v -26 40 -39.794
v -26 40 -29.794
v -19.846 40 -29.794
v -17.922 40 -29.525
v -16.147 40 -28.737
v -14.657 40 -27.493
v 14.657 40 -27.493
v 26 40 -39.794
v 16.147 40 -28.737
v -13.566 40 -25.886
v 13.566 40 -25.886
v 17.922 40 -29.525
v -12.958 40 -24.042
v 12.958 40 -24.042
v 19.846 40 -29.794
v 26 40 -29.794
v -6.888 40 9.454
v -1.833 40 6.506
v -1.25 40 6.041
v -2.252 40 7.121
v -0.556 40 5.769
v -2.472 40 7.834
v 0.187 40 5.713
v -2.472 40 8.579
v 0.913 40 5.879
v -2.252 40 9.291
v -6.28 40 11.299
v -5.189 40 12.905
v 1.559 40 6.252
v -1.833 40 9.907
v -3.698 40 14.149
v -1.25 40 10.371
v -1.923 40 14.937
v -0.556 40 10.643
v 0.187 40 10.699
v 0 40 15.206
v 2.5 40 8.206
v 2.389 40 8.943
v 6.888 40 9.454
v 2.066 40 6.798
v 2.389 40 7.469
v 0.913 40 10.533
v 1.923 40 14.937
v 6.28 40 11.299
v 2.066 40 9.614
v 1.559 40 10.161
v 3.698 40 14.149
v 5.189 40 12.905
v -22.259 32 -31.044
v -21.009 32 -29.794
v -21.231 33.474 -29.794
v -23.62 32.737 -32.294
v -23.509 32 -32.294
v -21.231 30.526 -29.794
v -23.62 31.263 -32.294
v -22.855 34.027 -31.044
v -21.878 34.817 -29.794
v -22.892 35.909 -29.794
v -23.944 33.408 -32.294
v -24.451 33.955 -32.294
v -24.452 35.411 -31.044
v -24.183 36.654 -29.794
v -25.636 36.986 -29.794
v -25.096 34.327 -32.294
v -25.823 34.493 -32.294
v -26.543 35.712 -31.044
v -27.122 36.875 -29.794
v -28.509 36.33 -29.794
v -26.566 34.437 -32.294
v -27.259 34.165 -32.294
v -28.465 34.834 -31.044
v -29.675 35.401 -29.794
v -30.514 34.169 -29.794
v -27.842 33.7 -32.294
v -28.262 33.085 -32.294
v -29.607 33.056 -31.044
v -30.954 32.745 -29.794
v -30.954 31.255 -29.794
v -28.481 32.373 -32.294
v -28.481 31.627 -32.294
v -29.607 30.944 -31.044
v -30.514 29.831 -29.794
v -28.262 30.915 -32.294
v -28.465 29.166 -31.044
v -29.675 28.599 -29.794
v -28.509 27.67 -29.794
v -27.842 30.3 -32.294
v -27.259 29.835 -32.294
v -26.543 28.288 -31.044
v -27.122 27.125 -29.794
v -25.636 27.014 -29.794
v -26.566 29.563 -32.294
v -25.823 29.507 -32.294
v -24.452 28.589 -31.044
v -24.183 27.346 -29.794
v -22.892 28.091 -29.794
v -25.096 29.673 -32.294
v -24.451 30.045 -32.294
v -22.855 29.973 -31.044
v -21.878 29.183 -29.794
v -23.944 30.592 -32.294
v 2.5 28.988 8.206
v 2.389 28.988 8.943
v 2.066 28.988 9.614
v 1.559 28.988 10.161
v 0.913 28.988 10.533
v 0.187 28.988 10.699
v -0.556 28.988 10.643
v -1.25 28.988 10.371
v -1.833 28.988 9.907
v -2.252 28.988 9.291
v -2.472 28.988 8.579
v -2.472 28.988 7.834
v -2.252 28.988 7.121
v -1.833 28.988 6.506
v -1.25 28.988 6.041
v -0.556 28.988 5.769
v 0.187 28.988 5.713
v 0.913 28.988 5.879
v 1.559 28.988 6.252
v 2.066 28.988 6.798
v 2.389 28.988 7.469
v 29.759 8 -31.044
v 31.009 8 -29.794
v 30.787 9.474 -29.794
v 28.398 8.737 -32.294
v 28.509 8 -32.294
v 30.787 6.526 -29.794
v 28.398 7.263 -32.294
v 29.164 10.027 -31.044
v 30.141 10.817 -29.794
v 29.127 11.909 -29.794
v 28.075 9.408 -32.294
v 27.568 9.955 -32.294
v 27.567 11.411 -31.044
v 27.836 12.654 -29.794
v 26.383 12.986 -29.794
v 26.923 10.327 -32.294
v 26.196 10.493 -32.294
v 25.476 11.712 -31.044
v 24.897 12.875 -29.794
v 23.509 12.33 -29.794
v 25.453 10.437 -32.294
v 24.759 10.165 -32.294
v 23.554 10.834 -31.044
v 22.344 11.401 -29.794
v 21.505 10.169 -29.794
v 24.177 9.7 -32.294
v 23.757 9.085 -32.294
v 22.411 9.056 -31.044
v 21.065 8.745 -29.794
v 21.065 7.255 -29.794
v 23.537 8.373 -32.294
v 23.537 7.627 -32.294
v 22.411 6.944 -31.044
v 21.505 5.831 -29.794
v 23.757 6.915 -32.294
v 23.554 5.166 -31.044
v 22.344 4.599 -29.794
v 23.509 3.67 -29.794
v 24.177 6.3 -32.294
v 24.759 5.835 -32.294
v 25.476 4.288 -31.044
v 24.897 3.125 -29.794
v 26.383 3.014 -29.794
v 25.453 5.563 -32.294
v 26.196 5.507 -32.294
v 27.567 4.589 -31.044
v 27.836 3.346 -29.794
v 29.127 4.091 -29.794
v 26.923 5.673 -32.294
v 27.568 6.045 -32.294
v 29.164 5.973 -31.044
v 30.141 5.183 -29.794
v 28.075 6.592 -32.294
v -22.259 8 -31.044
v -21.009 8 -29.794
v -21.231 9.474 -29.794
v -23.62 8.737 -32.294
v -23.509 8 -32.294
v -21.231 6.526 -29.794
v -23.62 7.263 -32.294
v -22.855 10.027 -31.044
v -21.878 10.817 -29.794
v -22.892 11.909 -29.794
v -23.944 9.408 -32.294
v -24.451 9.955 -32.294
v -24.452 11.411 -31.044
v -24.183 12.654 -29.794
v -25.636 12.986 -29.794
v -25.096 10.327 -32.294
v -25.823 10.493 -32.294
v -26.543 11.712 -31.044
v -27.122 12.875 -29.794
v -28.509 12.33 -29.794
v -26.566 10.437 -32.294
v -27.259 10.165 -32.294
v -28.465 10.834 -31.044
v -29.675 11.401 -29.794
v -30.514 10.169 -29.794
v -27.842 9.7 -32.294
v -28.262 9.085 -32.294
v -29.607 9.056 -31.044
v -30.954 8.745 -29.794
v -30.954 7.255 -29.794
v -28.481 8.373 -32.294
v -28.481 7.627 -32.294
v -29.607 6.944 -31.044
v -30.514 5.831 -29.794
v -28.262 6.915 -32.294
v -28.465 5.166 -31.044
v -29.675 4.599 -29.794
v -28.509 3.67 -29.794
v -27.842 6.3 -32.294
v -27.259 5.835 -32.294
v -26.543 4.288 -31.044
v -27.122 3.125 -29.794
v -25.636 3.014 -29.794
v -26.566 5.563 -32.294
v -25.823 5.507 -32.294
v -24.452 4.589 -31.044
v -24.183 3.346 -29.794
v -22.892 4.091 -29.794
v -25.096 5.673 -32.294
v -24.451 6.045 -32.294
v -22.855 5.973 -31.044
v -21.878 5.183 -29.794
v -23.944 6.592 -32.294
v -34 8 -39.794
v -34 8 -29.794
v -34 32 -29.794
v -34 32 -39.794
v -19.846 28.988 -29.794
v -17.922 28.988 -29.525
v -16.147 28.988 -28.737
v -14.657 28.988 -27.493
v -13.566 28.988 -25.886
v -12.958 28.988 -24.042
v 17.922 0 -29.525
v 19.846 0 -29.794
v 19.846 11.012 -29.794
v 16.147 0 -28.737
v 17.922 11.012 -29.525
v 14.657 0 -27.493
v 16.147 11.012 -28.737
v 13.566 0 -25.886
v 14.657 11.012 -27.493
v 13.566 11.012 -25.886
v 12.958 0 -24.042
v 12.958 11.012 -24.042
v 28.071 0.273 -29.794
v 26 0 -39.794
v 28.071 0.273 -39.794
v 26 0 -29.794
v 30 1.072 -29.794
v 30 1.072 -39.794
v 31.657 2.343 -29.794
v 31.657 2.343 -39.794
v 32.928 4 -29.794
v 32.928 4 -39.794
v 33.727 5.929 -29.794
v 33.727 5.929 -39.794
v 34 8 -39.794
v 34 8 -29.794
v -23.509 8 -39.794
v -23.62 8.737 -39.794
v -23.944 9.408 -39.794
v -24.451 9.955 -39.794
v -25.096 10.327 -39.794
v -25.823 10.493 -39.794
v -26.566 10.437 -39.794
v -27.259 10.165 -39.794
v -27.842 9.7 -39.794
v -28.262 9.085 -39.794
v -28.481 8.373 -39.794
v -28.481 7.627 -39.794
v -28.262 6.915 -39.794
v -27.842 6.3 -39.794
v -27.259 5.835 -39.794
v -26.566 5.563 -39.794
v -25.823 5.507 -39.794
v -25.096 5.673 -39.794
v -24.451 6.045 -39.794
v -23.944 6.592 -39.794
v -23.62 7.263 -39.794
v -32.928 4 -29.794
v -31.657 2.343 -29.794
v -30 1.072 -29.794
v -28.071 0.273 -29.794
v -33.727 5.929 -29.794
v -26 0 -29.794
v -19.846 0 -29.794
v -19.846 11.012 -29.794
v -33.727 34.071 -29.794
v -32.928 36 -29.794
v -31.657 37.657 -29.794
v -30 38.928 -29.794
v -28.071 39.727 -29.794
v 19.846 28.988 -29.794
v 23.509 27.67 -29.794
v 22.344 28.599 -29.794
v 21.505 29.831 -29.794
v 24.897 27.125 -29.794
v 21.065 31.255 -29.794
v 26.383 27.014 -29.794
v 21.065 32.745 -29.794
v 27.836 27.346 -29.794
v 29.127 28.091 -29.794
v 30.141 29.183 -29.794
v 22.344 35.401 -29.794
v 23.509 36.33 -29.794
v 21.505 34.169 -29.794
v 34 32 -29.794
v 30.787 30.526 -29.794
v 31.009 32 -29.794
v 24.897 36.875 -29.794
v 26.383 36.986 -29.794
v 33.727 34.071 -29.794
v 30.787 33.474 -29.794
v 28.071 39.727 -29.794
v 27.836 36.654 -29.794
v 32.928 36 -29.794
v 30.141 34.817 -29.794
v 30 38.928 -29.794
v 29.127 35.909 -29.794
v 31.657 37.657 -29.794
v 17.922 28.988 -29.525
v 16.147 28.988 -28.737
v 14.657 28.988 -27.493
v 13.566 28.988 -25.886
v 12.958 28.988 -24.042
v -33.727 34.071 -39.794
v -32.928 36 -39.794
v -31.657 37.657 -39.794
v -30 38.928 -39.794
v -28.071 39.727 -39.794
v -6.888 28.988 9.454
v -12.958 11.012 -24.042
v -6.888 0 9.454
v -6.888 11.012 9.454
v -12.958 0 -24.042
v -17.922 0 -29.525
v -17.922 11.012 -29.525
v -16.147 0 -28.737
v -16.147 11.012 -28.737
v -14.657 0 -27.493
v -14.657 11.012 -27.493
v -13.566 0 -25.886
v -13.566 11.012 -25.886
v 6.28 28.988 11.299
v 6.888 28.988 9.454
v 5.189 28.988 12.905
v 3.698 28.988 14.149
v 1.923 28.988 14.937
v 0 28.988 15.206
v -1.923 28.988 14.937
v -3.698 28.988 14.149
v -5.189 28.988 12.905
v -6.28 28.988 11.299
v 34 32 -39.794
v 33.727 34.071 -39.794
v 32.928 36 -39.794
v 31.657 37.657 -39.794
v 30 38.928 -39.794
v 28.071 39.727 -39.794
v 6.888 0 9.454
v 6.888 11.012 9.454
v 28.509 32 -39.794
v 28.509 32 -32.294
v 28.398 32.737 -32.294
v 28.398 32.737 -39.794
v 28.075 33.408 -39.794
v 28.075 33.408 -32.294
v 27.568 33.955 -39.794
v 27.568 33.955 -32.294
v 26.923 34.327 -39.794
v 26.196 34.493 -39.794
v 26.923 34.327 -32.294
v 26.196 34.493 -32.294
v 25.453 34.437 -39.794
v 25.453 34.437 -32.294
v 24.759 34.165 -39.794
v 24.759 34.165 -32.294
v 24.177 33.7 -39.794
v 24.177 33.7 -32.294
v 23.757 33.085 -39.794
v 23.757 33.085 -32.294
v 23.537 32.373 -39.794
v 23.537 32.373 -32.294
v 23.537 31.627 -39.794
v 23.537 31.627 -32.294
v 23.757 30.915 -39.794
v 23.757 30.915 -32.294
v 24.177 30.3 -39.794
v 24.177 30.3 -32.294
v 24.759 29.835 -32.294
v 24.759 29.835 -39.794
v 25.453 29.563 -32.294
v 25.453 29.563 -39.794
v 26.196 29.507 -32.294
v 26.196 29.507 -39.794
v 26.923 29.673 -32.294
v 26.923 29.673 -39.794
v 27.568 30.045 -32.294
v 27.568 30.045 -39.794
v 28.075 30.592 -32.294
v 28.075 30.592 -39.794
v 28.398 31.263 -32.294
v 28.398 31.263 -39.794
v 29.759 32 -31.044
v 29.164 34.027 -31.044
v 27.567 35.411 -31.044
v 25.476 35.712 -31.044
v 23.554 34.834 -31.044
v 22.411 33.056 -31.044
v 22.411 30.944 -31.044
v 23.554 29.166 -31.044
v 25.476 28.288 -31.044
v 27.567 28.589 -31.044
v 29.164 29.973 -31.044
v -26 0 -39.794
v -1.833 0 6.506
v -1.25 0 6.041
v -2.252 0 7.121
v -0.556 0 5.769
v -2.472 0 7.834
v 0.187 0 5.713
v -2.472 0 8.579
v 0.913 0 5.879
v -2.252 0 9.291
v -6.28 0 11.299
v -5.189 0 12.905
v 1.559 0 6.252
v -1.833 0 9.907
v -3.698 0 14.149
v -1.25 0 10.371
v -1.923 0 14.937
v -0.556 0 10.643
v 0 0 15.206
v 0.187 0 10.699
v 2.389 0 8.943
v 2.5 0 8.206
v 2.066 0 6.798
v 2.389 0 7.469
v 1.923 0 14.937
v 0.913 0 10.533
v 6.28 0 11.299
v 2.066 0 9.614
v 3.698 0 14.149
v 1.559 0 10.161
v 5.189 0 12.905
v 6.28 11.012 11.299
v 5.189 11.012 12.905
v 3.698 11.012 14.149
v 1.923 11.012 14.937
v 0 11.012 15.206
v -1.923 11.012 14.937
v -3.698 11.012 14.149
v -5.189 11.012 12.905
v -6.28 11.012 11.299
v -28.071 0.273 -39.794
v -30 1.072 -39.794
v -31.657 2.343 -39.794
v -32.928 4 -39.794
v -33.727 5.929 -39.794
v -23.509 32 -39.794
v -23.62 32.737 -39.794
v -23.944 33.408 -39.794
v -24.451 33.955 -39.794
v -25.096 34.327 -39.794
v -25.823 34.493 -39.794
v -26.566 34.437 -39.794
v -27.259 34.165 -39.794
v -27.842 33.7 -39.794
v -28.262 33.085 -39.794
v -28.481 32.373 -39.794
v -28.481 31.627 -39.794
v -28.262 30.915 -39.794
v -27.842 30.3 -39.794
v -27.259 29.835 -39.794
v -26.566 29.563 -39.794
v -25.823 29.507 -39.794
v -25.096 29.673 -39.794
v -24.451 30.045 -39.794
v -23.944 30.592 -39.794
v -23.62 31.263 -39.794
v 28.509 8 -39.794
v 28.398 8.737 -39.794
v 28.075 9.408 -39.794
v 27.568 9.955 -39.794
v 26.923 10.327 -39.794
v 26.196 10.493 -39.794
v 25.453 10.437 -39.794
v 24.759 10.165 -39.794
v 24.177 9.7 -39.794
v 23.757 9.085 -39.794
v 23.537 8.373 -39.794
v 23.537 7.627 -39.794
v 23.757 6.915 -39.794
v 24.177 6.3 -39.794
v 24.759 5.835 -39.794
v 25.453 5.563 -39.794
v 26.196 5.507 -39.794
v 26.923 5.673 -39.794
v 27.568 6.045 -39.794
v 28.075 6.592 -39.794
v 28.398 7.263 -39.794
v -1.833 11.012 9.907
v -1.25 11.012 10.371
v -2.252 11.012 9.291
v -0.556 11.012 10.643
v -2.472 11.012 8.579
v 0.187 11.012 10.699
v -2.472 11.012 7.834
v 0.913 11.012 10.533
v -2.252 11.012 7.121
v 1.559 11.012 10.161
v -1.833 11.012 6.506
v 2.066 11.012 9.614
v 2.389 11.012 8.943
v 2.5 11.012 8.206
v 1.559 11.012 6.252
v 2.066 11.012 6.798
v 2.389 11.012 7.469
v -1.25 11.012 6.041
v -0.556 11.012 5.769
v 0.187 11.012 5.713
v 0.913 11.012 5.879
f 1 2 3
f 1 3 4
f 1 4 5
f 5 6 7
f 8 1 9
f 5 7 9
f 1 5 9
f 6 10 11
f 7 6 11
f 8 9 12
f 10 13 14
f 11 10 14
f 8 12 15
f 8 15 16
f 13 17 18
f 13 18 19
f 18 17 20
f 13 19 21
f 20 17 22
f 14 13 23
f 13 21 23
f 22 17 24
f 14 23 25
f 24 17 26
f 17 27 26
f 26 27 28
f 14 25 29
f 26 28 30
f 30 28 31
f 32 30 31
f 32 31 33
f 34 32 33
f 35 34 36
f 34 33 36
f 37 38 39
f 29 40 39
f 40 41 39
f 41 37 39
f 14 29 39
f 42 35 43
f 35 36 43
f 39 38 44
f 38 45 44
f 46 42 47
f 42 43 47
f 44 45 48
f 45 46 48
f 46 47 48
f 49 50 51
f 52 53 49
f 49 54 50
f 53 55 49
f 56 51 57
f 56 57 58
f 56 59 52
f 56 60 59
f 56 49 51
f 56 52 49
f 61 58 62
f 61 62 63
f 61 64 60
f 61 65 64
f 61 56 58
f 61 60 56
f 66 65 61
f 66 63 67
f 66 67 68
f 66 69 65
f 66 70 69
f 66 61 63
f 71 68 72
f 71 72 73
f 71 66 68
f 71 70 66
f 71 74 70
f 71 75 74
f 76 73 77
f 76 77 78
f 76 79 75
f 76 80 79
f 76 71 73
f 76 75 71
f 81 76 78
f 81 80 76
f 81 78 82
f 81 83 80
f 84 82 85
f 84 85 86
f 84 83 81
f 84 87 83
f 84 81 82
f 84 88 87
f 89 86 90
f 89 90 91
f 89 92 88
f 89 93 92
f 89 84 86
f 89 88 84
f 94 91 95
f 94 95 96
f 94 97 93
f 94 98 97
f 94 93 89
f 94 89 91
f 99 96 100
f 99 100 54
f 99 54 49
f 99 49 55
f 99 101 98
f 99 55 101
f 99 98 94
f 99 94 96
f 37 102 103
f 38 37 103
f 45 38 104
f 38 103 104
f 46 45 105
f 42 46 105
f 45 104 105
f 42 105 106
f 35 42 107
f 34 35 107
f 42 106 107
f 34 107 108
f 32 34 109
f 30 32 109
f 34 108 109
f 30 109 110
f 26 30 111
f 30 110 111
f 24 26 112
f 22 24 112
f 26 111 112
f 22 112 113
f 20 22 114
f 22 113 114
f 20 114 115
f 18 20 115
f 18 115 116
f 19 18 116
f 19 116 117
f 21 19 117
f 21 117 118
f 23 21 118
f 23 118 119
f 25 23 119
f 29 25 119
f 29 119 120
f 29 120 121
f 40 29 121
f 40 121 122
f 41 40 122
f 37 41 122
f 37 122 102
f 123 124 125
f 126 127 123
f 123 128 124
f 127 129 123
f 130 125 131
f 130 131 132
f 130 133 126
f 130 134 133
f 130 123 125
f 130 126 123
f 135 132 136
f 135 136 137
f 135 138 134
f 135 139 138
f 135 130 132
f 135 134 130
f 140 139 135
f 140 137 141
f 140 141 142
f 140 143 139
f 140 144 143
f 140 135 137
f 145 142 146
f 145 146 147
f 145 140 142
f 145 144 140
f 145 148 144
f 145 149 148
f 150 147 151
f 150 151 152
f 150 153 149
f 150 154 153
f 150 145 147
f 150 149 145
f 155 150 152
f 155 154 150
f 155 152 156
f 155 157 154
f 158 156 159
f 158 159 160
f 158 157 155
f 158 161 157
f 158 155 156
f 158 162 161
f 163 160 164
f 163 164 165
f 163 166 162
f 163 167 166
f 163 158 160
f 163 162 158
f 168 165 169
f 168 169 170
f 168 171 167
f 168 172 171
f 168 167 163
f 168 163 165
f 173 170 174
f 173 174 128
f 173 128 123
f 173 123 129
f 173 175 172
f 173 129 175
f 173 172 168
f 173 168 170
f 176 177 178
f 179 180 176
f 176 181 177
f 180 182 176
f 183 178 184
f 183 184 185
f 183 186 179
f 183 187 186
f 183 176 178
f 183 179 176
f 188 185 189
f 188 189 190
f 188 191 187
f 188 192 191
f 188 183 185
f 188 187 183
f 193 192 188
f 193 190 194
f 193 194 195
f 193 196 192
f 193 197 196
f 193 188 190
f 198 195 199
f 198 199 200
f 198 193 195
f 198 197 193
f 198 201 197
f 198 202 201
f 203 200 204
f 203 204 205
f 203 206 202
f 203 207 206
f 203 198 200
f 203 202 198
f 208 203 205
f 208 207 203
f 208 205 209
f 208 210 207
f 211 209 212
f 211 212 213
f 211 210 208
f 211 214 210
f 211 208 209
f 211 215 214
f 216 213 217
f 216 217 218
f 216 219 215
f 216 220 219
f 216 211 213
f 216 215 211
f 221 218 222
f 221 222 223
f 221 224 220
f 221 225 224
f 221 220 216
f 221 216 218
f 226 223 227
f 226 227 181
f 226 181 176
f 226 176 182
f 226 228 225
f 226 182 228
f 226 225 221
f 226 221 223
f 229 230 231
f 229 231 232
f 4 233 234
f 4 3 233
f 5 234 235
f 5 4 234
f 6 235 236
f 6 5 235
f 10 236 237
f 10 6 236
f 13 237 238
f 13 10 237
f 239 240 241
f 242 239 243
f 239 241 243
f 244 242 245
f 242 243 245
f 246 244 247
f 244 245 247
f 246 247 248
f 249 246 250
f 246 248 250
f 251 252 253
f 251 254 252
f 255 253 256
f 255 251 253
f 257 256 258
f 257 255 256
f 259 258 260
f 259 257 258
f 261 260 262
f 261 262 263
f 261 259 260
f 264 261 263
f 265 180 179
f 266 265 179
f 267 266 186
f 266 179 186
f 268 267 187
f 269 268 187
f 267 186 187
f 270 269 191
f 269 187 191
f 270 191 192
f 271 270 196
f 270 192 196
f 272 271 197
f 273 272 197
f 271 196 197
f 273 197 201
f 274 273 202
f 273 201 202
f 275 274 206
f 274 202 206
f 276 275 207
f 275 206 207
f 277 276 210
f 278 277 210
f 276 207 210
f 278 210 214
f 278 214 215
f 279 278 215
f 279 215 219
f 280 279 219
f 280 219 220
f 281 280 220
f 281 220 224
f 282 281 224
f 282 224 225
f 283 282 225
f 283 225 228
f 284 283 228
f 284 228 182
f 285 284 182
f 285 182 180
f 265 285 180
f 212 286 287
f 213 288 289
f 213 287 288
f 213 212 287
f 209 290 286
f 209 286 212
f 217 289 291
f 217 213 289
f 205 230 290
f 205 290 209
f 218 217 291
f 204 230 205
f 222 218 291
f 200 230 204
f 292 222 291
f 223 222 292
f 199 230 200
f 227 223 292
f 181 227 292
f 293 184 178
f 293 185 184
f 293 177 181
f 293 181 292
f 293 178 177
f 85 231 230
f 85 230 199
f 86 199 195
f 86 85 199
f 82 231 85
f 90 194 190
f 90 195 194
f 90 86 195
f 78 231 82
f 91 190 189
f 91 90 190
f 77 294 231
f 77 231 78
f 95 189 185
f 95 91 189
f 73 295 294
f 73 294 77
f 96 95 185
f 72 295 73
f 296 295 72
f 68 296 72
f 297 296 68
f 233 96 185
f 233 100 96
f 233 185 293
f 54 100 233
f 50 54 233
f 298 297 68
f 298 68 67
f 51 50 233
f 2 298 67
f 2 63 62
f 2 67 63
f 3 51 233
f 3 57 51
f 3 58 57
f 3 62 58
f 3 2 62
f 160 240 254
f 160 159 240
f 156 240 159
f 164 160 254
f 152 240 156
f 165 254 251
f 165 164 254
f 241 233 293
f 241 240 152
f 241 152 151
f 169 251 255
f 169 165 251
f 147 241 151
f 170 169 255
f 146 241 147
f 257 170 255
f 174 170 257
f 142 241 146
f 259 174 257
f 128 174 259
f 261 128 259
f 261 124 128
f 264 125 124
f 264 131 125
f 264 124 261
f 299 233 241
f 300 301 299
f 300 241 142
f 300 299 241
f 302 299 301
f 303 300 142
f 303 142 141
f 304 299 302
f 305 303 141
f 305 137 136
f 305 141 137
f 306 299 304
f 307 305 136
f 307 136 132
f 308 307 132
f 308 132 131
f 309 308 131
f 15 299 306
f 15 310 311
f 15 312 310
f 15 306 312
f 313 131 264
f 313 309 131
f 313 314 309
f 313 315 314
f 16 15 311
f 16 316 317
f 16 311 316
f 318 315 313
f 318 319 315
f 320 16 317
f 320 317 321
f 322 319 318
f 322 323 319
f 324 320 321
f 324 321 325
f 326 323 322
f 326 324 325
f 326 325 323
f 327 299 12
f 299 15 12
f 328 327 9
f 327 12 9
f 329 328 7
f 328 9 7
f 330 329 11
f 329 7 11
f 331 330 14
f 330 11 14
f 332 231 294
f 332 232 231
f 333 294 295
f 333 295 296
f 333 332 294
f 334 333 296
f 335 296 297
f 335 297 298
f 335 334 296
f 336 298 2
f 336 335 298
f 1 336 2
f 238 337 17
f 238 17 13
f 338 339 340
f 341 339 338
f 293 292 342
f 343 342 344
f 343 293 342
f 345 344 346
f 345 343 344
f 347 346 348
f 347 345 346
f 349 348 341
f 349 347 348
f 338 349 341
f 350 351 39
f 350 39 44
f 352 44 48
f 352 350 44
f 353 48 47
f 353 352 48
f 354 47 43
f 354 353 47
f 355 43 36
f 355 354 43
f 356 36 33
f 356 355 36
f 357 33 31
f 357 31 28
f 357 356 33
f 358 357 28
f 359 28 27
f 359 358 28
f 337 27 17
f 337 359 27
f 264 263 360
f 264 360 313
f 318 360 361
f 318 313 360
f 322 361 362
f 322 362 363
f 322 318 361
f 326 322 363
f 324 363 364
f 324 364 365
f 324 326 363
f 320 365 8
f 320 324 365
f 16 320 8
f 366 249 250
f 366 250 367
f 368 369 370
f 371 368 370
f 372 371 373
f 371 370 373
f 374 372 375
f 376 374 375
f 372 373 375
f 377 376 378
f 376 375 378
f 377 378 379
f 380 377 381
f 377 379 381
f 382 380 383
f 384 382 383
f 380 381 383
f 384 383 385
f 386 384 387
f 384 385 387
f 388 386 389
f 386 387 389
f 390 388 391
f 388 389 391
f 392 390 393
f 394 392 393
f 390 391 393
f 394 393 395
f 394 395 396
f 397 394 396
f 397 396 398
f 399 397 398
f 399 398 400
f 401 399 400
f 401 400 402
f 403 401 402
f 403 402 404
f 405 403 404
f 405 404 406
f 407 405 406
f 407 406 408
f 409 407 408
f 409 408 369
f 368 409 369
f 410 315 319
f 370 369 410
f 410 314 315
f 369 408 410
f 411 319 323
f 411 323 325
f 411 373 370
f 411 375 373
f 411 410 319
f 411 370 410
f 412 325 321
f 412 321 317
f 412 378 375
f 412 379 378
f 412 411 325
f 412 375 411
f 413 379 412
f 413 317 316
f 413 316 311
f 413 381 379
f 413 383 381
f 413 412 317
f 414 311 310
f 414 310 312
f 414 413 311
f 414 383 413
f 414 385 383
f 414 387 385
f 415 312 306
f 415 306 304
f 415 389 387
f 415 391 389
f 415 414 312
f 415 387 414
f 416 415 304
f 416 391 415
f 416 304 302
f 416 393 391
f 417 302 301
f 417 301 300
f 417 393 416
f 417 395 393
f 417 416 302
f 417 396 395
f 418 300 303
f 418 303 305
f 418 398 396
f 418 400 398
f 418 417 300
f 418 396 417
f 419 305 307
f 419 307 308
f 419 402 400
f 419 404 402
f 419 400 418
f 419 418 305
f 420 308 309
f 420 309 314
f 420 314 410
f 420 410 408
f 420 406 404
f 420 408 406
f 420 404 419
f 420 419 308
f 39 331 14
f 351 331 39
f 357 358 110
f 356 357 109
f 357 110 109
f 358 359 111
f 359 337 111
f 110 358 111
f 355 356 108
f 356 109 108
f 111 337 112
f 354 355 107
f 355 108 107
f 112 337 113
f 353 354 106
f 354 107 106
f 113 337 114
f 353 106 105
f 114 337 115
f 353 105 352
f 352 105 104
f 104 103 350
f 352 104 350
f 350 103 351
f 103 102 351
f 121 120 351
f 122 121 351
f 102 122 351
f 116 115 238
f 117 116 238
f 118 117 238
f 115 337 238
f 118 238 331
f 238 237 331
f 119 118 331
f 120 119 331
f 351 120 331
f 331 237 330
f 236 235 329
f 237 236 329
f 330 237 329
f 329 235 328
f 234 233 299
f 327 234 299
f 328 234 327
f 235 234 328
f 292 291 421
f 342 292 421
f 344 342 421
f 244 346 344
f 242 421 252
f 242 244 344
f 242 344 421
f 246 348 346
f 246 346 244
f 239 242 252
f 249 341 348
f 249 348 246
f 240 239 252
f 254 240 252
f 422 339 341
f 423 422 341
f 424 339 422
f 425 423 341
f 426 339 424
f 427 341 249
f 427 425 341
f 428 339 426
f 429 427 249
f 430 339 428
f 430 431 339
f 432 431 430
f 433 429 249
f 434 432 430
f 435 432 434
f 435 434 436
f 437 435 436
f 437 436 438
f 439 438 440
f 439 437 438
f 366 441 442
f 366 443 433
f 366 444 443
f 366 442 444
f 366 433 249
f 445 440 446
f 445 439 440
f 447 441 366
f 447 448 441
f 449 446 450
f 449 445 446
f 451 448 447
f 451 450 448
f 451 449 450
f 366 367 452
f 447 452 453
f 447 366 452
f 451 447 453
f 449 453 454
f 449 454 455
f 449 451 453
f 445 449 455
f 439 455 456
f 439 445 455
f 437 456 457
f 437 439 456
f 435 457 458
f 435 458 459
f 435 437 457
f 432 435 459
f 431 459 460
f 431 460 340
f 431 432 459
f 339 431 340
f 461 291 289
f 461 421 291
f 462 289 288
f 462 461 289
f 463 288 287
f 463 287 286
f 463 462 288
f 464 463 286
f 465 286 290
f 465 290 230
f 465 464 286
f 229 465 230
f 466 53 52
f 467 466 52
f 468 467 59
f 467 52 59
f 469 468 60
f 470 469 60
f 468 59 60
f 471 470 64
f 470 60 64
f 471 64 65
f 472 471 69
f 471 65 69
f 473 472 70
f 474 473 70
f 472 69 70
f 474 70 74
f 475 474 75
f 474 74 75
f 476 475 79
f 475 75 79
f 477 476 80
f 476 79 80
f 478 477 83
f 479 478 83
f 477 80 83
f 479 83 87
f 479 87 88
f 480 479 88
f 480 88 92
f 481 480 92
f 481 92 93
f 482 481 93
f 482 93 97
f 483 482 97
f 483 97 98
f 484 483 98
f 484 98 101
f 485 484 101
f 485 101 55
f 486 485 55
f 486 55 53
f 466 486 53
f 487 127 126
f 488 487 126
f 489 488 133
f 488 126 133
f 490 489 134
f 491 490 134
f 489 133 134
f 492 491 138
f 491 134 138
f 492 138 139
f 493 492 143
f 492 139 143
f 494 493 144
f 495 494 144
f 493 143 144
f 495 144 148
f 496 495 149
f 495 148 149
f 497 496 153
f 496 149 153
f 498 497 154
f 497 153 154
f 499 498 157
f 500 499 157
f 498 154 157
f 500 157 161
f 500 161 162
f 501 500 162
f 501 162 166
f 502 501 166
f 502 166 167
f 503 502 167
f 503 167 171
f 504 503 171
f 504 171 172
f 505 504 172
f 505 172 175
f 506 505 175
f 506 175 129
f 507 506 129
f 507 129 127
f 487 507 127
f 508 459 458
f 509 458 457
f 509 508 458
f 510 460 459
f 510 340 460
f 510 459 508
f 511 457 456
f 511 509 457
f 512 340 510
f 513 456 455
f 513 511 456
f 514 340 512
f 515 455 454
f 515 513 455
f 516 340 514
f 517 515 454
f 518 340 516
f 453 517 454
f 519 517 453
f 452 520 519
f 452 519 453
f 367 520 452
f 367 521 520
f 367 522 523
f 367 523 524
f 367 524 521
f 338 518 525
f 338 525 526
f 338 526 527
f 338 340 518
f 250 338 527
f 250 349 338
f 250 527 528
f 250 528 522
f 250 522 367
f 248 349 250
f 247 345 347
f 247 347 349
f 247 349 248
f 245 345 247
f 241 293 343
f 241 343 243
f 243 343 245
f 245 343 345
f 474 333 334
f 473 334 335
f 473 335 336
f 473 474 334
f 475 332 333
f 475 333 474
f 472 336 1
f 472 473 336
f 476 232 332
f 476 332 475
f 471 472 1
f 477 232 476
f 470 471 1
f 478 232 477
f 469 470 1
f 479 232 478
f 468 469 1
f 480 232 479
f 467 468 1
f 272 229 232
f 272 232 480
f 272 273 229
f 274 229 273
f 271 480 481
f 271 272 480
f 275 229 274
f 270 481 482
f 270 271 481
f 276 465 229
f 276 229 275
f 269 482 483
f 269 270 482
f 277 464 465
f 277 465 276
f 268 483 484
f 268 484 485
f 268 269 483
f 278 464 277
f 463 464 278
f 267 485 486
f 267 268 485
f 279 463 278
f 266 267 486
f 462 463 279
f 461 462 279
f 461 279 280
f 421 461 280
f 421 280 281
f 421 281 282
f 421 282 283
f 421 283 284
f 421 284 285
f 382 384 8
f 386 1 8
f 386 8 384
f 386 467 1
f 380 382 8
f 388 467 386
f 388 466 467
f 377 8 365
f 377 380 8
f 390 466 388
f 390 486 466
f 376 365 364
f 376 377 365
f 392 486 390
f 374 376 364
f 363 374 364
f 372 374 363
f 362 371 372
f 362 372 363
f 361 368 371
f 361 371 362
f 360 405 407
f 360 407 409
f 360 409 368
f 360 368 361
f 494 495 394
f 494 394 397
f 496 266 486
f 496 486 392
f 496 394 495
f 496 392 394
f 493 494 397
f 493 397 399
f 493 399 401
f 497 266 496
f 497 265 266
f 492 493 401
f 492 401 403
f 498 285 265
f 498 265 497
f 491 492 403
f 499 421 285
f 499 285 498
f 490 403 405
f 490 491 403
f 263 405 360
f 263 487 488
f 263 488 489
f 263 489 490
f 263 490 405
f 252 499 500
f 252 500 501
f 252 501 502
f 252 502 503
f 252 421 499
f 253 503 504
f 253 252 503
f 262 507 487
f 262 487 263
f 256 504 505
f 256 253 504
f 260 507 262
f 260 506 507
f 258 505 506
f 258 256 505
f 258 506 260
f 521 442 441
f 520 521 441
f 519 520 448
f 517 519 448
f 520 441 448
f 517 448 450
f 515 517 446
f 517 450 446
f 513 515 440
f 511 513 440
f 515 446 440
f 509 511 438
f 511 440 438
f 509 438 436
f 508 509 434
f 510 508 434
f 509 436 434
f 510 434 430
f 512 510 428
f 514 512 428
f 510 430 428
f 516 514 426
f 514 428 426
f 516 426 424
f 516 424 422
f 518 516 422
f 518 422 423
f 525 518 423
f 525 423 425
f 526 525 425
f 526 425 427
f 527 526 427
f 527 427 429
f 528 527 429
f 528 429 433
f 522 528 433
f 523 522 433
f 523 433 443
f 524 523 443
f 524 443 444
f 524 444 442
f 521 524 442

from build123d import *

# Parameters (mm, degrees)
F0_R      = 2.5
F1_DEPTH  = 40
F2_R      = 5
F2_R_2    = 2.5
F3_DEPTH  = 3
F4_W      = 32.6441857368
F4_H      = 17.9751312453
F5_DEPTH  = 50
F6_R      = 8
F9_R      = 7
F7_R      = 5
F7_R_2    = 2.5
F10_DEPTH = 3
F11_DEPTH = 25
F12_SIZE2 = 2.5
F12_SIZE  = 2.5


with BuildPart() as f1:
    # F0 (on Front) → F1 (new body)
    with BuildSketch(Plane.XZ):
        with BuildLine():
            Line((-6.8878248776, 9.4542597632), (-14, -29.7938862443))
            Line((-14, -29.7938862443), (14, -29.7938862443))
            Line((14, -29.7938862443), (6.8878248776, 9.4542597632))
            ThreePointArc((6.8878248776, 9.4542597632), (0, 15.2061137557), (-6.8878248776, 9.4542597632))
        make_face()
        with Locations((0, 8.2061137557)):
            Circle(F0_R, mode=Mode.SUBTRACT)
        Polygon((-34, -39.7938862443), (0, -39.7938862443), (34, -39.7938862443), (34, -29.7938862443), (14, -29.7938862443), (-14, -29.7938862443), (-34, -29.7938862443), align=None)
    extrude(amount=-F1_DEPTH)

    # F2 (on face) → F3 (cut)
    with BuildSketch(Plane.XY.offset(-29.7938862443)):
        with Locations((26.0093560517, 32)):
            Circle(F2_R)
        with Locations((26.0093560517, 32)):
            Circle(F2_R_2, mode=Mode.SUBTRACT)
        with Locations((-26.0093560517, 32)):
            Circle(F2_R)
        with Locations((-26.0093560517, 32)):
            Circle(F2_R_2, mode=Mode.SUBTRACT)
        with Locations((-26.0093560517, 8)):
            Circle(F2_R)
        with Locations((-26.0093560517, 8)):
            Circle(F2_R_2, mode=Mode.SUBTRACT)
        with Locations((26.0093560517, 8)):
            Circle(F2_R)
        with Locations((26.0093560517, 8)):
            Circle(F2_R_2, mode=Mode.SUBTRACT)
    extrude(amount=-F3_DEPTH, mode=Mode.SUBTRACT)

    # F4 (on face) → F5 (cut)
    with BuildSketch(Plane.XY.offset(-29.7938862443)):
        with Locations((2.3220928684, 20)):
            Rectangle(F4_W, F4_H)
    extrude(amount=F5_DEPTH, mode=Mode.SUBTRACT)

    # F6
    f6_edges = [f1.edges().sort_by_distance(p)[0] for p in [
        (-34, 0, -34.793886),
        (34, 0, -34.793886),
        (34, 40, -34.793886),
        (-34, 40, -34.793886),
    ]]
    fillet(f6_edges, radius=F6_R)

    # F9
    f9_edges = [f1.edges().sort_by_distance(p)[0] for p in [
        (-14, 5.506217, -29.793886),
        (-14, 34.493783, -29.793886),
        (14, 5.506217, -29.793886),
        (14, 34.493783, -29.793886),
    ]]
    fillet(f9_edges, radius=F9_R)

    # F7 (on face) → F10 (join)
    with BuildSketch(Plane.XY.offset(-32.7938862443)):
        with Locations((-26.0093560517, 32)):
            Circle(F7_R)
        with Locations((-26.0093560517, 32)):
            Circle(F7_R_2, mode=Mode.SUBTRACT)
        with Locations((26.0093560517, 32)):
            Circle(F7_R)
        with Locations((26.0093560517, 32)):
            Circle(F7_R_2, mode=Mode.SUBTRACT)
        with Locations((26.0093560517, 8)):
            Circle(F7_R)
        with Locations((26.0093560517, 8)):
            Circle(F7_R_2, mode=Mode.SUBTRACT)
        with Locations((-26.0093560517, 8)):
            Circle(F7_R)
        with Locations((-26.0093560517, 8)):
            Circle(F7_R_2, mode=Mode.SUBTRACT)
    extrude(amount=F10_DEPTH)

    # F2 (on face) → F11 (cut)
    with BuildSketch(Plane.XY.offset(-29.7938862443)):
        with Locations((-26.0093560517, 32)):
            Circle(F2_R_2)
        with Locations((-26.0093560517, 8)):
            Circle(F2_R_2)
        with Locations((26.0093560517, 8)):
            Circle(F2_R_2)
        with Locations((26.0093560517, 32)):
            Circle(F2_R_2)
    extrude(amount=-F11_DEPTH, mode=Mode.SUBTRACT)

    # F12
    f12_edges = [f1.edges().sort_by_distance(p)[0] for p in [
        (-28.509356, 32, -29.793886),
        (23.509356, 32, -29.793886),
        (23.509356, 8, -29.793886),
        (-28.509356, 8, -29.793886),
    ]]
    chamfer(f12_edges, length=F12_SIZE, length2=F12_SIZE2)


solid = f1.part
